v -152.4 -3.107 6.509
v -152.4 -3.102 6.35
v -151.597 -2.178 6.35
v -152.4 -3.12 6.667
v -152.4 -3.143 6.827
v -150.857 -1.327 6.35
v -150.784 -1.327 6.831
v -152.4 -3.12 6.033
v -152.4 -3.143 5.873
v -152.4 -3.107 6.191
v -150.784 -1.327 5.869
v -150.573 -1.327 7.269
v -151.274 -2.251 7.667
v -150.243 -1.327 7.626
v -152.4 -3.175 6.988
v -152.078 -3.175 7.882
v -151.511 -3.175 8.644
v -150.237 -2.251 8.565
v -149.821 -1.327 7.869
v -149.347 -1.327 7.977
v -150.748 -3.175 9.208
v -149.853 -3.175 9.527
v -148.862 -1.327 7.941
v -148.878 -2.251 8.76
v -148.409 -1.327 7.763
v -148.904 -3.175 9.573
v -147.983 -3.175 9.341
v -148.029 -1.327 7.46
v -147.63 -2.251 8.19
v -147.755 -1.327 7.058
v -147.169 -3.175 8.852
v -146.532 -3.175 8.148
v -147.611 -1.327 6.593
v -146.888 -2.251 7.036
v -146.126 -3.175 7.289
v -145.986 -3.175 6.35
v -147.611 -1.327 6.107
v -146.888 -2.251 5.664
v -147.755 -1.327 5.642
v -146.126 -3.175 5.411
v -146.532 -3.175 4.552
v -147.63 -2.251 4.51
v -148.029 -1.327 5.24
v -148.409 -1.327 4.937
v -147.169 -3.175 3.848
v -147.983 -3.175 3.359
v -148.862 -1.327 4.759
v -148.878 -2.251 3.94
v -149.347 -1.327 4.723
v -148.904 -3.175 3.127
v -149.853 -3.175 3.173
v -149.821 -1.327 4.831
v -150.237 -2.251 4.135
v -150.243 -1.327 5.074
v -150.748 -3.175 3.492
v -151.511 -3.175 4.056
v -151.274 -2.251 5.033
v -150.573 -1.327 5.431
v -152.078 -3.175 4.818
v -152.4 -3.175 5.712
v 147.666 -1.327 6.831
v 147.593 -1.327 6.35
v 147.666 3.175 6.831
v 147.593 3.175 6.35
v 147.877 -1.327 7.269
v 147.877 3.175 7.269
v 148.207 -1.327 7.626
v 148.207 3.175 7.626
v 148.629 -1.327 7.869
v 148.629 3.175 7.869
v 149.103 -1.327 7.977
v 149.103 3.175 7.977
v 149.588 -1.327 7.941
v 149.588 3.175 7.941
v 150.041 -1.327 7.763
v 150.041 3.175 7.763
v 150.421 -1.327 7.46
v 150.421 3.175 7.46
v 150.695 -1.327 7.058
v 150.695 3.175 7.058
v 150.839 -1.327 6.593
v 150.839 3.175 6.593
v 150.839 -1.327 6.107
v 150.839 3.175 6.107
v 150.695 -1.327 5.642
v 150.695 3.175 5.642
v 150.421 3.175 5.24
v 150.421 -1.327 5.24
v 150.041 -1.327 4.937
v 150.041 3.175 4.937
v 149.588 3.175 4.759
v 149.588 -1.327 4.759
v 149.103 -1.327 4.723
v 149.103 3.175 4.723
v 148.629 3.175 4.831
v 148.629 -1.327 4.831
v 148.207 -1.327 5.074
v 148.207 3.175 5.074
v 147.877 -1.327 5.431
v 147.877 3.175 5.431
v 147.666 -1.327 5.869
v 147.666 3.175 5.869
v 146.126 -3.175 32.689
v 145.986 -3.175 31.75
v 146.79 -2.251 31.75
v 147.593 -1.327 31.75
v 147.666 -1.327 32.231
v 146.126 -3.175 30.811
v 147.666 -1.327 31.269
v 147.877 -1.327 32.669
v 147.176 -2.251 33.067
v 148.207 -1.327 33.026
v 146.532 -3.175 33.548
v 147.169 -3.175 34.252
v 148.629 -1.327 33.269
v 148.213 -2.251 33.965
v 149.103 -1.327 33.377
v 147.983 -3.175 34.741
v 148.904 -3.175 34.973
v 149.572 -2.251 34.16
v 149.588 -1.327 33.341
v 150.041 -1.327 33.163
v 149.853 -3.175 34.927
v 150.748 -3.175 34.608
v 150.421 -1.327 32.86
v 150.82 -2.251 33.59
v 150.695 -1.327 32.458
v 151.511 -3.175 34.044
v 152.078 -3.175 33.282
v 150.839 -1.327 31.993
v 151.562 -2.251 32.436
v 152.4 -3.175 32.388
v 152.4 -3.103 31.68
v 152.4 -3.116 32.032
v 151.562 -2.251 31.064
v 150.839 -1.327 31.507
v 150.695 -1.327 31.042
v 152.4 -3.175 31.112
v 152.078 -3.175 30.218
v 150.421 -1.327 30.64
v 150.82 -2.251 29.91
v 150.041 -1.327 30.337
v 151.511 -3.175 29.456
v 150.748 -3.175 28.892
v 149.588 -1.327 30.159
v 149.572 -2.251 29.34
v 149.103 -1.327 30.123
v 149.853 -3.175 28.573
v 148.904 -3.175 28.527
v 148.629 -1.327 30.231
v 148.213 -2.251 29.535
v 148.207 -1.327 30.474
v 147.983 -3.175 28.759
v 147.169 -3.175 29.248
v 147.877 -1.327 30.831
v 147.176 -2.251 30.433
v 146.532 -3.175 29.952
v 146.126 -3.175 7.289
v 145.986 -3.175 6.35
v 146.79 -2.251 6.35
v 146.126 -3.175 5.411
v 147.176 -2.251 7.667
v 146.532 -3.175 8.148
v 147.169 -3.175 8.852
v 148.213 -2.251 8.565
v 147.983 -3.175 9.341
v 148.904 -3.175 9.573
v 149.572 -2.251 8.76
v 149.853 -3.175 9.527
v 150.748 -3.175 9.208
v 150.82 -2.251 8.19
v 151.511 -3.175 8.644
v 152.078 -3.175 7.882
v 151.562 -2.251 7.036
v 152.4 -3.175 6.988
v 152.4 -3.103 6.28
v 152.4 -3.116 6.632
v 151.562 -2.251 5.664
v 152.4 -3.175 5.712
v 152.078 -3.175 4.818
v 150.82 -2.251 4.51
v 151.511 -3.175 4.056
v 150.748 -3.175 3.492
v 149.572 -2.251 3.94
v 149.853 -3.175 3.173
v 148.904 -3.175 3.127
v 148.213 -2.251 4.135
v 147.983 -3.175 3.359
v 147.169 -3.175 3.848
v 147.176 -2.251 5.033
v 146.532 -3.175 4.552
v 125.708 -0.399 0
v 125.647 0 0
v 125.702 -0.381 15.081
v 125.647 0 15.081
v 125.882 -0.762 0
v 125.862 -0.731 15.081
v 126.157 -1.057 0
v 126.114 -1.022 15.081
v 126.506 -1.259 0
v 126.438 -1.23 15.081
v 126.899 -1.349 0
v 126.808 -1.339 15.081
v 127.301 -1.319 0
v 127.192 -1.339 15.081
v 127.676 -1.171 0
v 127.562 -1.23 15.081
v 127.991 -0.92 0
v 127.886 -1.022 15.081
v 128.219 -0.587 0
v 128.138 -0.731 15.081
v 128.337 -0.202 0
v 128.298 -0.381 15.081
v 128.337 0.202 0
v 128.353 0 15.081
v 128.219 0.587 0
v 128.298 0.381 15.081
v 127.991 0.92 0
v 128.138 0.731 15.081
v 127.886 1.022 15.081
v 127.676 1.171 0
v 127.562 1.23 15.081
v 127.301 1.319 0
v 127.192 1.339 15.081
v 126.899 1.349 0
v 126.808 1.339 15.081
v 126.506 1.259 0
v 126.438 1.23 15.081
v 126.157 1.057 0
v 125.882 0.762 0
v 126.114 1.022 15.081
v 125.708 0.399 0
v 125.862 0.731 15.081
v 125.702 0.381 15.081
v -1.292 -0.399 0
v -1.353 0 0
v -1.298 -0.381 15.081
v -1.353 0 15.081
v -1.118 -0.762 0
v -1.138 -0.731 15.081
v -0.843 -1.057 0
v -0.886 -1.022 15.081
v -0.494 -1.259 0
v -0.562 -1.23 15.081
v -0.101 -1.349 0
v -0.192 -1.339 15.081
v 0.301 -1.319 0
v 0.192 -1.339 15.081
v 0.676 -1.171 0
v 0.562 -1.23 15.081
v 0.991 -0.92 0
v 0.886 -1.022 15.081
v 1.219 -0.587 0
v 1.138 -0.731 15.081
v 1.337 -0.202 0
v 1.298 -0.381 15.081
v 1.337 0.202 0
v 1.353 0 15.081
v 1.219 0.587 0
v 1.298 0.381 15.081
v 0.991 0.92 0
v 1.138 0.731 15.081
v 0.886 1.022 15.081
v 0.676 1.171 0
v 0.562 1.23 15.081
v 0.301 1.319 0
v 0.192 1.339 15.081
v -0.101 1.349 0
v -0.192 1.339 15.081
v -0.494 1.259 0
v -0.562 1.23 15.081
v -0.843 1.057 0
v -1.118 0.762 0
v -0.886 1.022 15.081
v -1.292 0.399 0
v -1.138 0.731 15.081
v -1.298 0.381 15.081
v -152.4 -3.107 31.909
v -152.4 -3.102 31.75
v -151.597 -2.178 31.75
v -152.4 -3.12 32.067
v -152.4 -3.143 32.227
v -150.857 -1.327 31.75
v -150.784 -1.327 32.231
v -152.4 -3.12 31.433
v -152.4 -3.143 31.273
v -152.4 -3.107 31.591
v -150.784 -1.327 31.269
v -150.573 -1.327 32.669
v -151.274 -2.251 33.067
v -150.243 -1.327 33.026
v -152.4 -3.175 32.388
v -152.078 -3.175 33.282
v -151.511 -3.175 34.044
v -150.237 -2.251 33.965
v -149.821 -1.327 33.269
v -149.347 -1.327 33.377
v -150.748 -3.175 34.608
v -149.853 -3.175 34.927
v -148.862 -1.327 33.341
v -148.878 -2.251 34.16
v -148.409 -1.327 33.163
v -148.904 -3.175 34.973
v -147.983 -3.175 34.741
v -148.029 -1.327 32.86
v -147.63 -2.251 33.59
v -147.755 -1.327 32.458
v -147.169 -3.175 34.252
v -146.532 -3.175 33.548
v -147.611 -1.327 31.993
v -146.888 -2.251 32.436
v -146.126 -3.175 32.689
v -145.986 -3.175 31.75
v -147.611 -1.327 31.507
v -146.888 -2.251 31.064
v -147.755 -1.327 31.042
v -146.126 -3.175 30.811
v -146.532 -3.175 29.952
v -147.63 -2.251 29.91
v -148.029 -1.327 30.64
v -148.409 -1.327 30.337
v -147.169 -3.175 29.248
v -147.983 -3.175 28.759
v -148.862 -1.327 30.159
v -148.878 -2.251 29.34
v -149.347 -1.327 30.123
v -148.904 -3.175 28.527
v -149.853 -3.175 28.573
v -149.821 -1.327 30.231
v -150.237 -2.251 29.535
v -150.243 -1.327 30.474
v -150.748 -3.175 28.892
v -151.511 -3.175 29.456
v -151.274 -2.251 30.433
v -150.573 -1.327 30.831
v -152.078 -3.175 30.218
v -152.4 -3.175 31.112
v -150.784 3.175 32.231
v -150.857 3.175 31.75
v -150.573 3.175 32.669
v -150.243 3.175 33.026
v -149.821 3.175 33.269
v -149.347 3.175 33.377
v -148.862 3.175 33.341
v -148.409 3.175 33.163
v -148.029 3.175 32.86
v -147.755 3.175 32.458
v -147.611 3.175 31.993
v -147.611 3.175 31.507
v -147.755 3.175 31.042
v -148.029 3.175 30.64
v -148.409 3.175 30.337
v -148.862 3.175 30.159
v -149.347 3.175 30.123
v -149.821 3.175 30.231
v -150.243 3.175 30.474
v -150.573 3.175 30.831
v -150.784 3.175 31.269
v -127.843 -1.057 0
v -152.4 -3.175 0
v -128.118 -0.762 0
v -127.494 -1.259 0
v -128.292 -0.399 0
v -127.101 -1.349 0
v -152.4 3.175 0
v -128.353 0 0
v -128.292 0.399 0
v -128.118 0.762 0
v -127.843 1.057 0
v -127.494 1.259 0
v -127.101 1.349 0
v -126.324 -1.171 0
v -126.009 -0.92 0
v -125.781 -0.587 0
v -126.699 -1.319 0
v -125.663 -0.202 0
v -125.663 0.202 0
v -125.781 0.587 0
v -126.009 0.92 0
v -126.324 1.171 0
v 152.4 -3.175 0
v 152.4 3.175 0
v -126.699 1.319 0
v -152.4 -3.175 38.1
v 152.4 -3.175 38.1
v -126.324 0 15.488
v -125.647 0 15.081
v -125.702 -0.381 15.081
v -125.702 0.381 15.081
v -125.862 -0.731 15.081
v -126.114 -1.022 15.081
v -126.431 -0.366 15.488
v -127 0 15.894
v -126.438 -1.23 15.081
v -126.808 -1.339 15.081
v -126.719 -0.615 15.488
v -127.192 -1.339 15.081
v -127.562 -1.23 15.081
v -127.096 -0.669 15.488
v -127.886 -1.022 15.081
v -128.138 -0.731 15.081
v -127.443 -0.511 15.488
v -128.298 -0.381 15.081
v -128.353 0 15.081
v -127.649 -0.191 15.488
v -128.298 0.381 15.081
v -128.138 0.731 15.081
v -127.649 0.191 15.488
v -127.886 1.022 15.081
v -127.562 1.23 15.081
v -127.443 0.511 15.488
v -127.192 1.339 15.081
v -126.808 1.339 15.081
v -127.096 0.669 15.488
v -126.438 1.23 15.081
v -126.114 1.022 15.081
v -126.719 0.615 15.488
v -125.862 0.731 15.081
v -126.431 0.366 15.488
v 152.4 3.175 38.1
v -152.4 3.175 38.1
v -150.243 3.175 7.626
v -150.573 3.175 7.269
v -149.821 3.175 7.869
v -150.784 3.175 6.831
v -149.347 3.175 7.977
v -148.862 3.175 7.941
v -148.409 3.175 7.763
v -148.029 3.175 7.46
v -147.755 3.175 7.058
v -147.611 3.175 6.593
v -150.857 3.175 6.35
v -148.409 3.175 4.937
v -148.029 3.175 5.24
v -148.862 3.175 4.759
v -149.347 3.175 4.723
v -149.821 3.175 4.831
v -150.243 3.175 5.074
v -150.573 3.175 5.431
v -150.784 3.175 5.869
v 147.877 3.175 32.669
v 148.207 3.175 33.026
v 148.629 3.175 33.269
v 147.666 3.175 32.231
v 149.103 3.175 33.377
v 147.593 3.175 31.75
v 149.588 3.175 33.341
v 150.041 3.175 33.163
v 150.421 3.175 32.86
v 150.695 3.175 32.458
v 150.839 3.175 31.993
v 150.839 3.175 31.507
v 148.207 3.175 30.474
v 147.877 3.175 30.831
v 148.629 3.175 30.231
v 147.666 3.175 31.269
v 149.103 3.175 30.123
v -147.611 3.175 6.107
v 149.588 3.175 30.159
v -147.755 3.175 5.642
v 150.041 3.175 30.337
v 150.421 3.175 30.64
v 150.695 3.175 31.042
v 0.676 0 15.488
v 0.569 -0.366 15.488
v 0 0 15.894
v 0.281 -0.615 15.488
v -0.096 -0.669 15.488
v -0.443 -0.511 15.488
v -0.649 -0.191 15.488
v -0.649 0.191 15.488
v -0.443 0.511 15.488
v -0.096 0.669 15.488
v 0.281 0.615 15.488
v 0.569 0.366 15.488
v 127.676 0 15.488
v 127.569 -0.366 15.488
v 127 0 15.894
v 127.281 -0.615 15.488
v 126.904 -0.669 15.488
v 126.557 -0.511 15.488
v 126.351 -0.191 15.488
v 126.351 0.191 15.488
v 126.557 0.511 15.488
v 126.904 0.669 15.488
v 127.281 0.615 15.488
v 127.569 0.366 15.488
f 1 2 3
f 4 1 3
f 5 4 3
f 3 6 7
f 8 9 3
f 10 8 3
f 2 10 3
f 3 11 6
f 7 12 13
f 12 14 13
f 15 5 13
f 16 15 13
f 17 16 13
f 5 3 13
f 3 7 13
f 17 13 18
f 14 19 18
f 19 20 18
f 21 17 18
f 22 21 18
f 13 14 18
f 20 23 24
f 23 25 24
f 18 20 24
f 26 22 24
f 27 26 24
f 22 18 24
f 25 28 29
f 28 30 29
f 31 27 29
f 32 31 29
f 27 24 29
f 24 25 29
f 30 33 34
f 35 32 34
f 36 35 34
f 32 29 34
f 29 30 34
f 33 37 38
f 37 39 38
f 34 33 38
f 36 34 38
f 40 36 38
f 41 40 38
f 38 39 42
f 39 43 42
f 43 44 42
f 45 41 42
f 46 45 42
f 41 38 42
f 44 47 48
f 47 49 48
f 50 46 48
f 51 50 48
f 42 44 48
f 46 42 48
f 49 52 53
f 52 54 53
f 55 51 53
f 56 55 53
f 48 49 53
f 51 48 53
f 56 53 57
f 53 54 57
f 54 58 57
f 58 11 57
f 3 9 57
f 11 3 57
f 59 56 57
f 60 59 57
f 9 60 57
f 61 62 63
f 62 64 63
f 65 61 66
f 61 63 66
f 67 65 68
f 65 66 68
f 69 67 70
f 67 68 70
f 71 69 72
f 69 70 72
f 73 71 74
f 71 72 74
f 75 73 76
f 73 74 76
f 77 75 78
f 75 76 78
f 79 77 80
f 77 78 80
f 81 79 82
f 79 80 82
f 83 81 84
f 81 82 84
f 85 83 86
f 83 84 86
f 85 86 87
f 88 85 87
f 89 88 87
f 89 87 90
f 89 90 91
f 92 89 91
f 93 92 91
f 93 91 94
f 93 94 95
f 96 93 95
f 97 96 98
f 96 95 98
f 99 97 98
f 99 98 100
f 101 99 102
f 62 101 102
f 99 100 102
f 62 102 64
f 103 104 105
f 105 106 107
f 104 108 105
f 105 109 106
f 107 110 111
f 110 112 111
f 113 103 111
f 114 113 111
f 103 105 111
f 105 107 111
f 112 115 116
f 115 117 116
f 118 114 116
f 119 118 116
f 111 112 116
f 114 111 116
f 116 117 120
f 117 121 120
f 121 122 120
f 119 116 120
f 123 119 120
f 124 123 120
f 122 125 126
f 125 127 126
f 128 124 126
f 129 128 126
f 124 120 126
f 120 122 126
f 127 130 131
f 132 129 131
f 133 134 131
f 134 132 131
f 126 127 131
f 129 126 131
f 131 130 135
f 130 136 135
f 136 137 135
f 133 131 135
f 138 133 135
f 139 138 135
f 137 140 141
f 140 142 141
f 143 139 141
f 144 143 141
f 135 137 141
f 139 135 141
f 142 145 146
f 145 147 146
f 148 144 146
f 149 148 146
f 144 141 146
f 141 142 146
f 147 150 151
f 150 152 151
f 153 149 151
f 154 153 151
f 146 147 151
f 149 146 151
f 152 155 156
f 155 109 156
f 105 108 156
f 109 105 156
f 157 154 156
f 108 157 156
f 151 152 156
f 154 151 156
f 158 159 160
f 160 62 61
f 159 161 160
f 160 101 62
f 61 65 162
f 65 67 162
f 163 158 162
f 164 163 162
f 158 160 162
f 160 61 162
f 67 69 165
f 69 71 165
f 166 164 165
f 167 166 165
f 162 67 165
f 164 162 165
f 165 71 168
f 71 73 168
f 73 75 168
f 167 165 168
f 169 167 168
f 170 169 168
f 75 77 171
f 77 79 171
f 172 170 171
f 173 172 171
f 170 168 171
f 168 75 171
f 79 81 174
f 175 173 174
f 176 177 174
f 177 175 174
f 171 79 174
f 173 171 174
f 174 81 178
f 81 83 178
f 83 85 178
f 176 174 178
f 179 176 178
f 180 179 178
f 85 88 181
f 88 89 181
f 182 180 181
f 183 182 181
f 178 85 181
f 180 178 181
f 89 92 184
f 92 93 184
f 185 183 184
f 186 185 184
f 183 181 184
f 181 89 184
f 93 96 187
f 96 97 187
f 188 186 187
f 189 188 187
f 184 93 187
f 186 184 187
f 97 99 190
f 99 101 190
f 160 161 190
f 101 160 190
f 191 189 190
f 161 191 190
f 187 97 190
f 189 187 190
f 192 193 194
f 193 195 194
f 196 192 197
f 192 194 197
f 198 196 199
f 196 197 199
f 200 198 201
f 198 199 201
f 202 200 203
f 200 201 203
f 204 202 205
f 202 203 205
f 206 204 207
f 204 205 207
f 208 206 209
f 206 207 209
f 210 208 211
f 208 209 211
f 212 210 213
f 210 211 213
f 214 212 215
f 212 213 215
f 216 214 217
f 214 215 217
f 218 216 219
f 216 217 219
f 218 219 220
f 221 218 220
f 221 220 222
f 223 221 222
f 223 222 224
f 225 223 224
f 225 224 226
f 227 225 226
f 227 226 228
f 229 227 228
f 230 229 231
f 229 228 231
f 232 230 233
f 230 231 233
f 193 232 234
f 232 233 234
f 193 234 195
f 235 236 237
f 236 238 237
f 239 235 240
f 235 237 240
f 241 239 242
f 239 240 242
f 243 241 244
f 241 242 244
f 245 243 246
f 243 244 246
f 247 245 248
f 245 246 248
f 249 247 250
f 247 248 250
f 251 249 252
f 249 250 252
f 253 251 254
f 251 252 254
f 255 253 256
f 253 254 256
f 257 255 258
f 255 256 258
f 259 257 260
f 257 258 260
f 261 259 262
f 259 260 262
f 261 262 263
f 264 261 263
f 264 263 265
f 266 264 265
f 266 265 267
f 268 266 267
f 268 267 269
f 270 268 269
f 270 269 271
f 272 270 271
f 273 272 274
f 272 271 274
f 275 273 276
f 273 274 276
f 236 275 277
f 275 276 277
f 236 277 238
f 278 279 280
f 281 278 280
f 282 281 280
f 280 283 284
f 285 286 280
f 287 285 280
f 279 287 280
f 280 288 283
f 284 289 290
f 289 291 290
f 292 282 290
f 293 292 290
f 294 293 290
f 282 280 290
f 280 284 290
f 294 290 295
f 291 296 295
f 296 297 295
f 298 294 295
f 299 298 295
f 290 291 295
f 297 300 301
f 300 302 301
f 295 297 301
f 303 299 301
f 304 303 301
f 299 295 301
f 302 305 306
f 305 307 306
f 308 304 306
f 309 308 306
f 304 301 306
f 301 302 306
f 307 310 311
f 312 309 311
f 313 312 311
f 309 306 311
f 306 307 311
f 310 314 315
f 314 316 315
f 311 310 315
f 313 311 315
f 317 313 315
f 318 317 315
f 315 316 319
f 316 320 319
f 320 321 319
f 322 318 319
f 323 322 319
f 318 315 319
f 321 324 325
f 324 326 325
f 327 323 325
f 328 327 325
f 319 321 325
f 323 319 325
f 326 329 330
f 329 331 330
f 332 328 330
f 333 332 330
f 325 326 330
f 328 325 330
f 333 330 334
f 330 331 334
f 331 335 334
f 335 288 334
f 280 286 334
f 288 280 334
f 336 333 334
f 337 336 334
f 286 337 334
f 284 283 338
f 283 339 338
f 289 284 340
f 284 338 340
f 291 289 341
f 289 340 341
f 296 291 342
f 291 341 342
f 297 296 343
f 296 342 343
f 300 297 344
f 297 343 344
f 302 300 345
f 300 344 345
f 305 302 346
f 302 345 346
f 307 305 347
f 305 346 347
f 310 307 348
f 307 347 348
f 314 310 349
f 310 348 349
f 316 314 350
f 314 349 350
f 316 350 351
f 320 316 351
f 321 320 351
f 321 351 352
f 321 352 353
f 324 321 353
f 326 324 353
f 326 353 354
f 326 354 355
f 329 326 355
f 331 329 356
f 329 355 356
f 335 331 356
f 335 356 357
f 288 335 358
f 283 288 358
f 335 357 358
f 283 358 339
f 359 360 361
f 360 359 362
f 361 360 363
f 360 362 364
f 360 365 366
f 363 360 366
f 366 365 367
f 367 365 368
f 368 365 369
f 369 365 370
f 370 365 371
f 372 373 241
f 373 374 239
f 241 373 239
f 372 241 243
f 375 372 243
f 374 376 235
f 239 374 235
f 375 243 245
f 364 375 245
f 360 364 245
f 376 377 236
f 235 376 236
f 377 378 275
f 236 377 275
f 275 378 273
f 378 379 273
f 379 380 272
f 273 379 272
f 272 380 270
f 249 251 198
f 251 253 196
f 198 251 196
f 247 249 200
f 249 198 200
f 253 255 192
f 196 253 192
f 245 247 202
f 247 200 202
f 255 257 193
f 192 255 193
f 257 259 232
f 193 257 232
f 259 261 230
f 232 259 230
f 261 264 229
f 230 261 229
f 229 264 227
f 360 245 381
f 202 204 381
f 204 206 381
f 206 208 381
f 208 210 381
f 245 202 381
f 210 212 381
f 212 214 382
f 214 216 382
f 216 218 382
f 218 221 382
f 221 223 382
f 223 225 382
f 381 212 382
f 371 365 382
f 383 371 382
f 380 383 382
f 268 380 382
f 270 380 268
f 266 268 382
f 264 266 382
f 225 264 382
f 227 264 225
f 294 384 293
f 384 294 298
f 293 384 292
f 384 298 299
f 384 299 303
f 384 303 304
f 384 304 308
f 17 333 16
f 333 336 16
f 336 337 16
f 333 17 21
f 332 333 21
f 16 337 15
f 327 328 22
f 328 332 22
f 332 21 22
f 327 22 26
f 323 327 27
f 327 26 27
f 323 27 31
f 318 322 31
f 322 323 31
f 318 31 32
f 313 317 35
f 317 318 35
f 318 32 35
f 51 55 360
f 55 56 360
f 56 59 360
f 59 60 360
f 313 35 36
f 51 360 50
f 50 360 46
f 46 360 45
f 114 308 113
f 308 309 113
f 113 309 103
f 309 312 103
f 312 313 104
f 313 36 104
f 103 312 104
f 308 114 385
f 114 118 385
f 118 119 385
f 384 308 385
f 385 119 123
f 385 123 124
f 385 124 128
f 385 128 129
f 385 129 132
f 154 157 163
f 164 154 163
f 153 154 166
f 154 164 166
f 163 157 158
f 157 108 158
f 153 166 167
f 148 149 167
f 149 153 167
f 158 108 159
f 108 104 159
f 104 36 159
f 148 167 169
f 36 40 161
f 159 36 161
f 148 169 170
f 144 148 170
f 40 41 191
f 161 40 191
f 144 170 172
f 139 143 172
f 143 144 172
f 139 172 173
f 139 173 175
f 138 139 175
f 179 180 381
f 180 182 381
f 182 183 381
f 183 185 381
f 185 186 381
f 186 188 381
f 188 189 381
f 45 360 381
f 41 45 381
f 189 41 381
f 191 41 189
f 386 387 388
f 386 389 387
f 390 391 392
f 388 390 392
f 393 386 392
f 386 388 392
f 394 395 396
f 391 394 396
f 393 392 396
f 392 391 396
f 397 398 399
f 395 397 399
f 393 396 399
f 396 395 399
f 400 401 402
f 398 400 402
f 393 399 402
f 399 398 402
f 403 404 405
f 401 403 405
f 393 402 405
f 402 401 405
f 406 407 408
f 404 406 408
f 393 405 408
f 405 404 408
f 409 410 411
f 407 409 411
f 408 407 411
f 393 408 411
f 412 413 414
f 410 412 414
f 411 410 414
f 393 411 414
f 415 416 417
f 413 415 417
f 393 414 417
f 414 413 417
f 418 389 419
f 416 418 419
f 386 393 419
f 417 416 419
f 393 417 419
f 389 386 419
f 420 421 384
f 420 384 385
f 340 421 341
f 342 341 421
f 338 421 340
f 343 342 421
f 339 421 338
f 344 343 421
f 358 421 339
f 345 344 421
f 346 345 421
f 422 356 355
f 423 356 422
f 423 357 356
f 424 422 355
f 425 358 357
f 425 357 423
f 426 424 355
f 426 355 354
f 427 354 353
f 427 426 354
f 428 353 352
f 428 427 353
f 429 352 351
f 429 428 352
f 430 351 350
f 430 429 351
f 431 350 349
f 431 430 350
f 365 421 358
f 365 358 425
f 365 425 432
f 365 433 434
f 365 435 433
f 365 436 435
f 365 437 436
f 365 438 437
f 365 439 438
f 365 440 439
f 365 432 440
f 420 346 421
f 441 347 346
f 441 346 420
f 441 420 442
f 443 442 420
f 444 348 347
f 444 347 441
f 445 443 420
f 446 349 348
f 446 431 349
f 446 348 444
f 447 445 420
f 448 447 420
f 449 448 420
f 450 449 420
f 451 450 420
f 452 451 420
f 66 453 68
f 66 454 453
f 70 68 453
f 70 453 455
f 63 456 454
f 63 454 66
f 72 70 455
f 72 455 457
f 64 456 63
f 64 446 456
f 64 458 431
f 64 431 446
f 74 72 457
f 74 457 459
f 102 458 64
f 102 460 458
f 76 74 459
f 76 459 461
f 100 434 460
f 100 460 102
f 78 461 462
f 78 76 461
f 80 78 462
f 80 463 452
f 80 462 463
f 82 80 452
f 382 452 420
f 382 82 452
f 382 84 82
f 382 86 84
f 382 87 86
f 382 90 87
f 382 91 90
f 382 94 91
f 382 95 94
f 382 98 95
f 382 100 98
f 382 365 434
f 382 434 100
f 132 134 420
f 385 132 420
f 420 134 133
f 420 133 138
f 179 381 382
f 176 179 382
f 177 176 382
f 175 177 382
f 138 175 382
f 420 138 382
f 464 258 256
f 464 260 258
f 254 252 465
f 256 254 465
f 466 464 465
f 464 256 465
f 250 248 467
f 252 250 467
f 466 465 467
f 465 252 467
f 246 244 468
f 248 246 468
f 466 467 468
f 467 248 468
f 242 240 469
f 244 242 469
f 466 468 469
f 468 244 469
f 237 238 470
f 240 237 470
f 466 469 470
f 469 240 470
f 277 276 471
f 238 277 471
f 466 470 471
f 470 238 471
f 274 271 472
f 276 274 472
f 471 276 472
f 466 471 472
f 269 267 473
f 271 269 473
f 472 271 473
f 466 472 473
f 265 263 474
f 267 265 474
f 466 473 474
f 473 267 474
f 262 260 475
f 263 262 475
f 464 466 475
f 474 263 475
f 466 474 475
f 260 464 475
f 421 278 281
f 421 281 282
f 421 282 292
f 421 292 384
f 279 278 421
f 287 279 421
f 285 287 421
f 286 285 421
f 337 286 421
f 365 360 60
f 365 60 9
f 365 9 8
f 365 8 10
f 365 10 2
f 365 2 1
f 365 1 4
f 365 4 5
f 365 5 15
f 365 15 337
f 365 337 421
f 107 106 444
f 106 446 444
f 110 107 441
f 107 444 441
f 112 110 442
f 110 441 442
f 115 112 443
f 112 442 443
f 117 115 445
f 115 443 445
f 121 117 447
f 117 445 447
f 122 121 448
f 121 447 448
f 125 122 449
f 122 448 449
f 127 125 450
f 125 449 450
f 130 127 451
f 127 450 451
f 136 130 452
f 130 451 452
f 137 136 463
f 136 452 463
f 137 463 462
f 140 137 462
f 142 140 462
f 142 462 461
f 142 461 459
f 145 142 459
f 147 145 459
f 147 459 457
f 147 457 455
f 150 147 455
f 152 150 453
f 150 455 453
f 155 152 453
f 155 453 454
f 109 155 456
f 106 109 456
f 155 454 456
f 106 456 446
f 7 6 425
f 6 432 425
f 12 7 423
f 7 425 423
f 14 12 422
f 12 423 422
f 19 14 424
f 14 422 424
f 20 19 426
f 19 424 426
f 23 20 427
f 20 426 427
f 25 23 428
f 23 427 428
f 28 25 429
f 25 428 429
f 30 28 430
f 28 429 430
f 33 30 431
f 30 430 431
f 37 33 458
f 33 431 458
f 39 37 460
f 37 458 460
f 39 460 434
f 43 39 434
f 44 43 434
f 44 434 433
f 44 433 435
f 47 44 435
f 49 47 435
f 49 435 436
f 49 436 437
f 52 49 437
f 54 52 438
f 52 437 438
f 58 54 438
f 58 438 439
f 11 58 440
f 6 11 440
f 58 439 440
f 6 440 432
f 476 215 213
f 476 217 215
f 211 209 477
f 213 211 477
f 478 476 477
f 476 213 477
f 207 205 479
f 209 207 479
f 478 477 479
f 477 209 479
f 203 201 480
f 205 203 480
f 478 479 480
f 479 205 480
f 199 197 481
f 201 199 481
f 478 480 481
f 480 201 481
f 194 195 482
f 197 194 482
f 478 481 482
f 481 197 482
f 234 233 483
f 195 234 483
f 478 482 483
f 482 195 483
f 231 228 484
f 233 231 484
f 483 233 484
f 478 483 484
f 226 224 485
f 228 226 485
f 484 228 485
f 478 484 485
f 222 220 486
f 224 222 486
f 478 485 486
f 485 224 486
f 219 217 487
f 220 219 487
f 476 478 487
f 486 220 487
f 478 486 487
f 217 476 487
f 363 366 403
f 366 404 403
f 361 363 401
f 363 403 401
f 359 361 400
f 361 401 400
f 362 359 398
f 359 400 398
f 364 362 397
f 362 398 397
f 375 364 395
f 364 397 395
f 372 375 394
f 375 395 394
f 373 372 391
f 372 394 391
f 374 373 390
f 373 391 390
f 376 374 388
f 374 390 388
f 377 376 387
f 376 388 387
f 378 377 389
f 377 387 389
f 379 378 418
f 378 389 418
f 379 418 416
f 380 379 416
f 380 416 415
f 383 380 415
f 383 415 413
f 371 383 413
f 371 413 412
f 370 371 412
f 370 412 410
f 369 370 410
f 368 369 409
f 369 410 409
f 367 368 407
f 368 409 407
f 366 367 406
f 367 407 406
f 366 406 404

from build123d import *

# Parameters (mm, degrees)
F0_W           = 304.8
F0_H           = 6.35
F1_DEPTH       = 38.1
F3_D           = 2.7051
F3_DEPTH       = 15.08125
F3_TIP         = 0.8126940303
F5_D           = 3.2639
F5_CSINK_D     = 6.477
F5_CSINK_ANGLE = 82


with BuildPart() as f1:
    # F0 (on Top) → F1 (new body)
    with BuildSketch(Plane.XY):
        Rectangle(F0_W, F0_H)
    extrude(amount=F1_DEPTH)

    # F3
    with Locations(Plane(origin=(0, 0, 0), x_dir=(1, 0, 0), z_dir=(0, 0, -1))):
        with Locations((-127, 0), (127, 0), (0, 0)):
            Hole(F3_D / 2, depth=F3_DEPTH)
            with Locations((0, 0, -(F3_DEPTH + F3_TIP / 2))):  # 118° drill point
                Cone(0, F3_D / 2, F3_TIP, mode=Mode.SUBTRACT)

    # F5 (through all)
    with Locations(Plane.XZ.offset(3.175)):
        with Locations((-149.225, 31.75), (-149.225, 6.35), (149.225, 31.75), (149.225, 6.35)):
            CounterSinkHole(F5_D / 2, F5_CSINK_D / 2, counter_sink_angle=F5_CSINK_ANGLE)


solid = f1.part
